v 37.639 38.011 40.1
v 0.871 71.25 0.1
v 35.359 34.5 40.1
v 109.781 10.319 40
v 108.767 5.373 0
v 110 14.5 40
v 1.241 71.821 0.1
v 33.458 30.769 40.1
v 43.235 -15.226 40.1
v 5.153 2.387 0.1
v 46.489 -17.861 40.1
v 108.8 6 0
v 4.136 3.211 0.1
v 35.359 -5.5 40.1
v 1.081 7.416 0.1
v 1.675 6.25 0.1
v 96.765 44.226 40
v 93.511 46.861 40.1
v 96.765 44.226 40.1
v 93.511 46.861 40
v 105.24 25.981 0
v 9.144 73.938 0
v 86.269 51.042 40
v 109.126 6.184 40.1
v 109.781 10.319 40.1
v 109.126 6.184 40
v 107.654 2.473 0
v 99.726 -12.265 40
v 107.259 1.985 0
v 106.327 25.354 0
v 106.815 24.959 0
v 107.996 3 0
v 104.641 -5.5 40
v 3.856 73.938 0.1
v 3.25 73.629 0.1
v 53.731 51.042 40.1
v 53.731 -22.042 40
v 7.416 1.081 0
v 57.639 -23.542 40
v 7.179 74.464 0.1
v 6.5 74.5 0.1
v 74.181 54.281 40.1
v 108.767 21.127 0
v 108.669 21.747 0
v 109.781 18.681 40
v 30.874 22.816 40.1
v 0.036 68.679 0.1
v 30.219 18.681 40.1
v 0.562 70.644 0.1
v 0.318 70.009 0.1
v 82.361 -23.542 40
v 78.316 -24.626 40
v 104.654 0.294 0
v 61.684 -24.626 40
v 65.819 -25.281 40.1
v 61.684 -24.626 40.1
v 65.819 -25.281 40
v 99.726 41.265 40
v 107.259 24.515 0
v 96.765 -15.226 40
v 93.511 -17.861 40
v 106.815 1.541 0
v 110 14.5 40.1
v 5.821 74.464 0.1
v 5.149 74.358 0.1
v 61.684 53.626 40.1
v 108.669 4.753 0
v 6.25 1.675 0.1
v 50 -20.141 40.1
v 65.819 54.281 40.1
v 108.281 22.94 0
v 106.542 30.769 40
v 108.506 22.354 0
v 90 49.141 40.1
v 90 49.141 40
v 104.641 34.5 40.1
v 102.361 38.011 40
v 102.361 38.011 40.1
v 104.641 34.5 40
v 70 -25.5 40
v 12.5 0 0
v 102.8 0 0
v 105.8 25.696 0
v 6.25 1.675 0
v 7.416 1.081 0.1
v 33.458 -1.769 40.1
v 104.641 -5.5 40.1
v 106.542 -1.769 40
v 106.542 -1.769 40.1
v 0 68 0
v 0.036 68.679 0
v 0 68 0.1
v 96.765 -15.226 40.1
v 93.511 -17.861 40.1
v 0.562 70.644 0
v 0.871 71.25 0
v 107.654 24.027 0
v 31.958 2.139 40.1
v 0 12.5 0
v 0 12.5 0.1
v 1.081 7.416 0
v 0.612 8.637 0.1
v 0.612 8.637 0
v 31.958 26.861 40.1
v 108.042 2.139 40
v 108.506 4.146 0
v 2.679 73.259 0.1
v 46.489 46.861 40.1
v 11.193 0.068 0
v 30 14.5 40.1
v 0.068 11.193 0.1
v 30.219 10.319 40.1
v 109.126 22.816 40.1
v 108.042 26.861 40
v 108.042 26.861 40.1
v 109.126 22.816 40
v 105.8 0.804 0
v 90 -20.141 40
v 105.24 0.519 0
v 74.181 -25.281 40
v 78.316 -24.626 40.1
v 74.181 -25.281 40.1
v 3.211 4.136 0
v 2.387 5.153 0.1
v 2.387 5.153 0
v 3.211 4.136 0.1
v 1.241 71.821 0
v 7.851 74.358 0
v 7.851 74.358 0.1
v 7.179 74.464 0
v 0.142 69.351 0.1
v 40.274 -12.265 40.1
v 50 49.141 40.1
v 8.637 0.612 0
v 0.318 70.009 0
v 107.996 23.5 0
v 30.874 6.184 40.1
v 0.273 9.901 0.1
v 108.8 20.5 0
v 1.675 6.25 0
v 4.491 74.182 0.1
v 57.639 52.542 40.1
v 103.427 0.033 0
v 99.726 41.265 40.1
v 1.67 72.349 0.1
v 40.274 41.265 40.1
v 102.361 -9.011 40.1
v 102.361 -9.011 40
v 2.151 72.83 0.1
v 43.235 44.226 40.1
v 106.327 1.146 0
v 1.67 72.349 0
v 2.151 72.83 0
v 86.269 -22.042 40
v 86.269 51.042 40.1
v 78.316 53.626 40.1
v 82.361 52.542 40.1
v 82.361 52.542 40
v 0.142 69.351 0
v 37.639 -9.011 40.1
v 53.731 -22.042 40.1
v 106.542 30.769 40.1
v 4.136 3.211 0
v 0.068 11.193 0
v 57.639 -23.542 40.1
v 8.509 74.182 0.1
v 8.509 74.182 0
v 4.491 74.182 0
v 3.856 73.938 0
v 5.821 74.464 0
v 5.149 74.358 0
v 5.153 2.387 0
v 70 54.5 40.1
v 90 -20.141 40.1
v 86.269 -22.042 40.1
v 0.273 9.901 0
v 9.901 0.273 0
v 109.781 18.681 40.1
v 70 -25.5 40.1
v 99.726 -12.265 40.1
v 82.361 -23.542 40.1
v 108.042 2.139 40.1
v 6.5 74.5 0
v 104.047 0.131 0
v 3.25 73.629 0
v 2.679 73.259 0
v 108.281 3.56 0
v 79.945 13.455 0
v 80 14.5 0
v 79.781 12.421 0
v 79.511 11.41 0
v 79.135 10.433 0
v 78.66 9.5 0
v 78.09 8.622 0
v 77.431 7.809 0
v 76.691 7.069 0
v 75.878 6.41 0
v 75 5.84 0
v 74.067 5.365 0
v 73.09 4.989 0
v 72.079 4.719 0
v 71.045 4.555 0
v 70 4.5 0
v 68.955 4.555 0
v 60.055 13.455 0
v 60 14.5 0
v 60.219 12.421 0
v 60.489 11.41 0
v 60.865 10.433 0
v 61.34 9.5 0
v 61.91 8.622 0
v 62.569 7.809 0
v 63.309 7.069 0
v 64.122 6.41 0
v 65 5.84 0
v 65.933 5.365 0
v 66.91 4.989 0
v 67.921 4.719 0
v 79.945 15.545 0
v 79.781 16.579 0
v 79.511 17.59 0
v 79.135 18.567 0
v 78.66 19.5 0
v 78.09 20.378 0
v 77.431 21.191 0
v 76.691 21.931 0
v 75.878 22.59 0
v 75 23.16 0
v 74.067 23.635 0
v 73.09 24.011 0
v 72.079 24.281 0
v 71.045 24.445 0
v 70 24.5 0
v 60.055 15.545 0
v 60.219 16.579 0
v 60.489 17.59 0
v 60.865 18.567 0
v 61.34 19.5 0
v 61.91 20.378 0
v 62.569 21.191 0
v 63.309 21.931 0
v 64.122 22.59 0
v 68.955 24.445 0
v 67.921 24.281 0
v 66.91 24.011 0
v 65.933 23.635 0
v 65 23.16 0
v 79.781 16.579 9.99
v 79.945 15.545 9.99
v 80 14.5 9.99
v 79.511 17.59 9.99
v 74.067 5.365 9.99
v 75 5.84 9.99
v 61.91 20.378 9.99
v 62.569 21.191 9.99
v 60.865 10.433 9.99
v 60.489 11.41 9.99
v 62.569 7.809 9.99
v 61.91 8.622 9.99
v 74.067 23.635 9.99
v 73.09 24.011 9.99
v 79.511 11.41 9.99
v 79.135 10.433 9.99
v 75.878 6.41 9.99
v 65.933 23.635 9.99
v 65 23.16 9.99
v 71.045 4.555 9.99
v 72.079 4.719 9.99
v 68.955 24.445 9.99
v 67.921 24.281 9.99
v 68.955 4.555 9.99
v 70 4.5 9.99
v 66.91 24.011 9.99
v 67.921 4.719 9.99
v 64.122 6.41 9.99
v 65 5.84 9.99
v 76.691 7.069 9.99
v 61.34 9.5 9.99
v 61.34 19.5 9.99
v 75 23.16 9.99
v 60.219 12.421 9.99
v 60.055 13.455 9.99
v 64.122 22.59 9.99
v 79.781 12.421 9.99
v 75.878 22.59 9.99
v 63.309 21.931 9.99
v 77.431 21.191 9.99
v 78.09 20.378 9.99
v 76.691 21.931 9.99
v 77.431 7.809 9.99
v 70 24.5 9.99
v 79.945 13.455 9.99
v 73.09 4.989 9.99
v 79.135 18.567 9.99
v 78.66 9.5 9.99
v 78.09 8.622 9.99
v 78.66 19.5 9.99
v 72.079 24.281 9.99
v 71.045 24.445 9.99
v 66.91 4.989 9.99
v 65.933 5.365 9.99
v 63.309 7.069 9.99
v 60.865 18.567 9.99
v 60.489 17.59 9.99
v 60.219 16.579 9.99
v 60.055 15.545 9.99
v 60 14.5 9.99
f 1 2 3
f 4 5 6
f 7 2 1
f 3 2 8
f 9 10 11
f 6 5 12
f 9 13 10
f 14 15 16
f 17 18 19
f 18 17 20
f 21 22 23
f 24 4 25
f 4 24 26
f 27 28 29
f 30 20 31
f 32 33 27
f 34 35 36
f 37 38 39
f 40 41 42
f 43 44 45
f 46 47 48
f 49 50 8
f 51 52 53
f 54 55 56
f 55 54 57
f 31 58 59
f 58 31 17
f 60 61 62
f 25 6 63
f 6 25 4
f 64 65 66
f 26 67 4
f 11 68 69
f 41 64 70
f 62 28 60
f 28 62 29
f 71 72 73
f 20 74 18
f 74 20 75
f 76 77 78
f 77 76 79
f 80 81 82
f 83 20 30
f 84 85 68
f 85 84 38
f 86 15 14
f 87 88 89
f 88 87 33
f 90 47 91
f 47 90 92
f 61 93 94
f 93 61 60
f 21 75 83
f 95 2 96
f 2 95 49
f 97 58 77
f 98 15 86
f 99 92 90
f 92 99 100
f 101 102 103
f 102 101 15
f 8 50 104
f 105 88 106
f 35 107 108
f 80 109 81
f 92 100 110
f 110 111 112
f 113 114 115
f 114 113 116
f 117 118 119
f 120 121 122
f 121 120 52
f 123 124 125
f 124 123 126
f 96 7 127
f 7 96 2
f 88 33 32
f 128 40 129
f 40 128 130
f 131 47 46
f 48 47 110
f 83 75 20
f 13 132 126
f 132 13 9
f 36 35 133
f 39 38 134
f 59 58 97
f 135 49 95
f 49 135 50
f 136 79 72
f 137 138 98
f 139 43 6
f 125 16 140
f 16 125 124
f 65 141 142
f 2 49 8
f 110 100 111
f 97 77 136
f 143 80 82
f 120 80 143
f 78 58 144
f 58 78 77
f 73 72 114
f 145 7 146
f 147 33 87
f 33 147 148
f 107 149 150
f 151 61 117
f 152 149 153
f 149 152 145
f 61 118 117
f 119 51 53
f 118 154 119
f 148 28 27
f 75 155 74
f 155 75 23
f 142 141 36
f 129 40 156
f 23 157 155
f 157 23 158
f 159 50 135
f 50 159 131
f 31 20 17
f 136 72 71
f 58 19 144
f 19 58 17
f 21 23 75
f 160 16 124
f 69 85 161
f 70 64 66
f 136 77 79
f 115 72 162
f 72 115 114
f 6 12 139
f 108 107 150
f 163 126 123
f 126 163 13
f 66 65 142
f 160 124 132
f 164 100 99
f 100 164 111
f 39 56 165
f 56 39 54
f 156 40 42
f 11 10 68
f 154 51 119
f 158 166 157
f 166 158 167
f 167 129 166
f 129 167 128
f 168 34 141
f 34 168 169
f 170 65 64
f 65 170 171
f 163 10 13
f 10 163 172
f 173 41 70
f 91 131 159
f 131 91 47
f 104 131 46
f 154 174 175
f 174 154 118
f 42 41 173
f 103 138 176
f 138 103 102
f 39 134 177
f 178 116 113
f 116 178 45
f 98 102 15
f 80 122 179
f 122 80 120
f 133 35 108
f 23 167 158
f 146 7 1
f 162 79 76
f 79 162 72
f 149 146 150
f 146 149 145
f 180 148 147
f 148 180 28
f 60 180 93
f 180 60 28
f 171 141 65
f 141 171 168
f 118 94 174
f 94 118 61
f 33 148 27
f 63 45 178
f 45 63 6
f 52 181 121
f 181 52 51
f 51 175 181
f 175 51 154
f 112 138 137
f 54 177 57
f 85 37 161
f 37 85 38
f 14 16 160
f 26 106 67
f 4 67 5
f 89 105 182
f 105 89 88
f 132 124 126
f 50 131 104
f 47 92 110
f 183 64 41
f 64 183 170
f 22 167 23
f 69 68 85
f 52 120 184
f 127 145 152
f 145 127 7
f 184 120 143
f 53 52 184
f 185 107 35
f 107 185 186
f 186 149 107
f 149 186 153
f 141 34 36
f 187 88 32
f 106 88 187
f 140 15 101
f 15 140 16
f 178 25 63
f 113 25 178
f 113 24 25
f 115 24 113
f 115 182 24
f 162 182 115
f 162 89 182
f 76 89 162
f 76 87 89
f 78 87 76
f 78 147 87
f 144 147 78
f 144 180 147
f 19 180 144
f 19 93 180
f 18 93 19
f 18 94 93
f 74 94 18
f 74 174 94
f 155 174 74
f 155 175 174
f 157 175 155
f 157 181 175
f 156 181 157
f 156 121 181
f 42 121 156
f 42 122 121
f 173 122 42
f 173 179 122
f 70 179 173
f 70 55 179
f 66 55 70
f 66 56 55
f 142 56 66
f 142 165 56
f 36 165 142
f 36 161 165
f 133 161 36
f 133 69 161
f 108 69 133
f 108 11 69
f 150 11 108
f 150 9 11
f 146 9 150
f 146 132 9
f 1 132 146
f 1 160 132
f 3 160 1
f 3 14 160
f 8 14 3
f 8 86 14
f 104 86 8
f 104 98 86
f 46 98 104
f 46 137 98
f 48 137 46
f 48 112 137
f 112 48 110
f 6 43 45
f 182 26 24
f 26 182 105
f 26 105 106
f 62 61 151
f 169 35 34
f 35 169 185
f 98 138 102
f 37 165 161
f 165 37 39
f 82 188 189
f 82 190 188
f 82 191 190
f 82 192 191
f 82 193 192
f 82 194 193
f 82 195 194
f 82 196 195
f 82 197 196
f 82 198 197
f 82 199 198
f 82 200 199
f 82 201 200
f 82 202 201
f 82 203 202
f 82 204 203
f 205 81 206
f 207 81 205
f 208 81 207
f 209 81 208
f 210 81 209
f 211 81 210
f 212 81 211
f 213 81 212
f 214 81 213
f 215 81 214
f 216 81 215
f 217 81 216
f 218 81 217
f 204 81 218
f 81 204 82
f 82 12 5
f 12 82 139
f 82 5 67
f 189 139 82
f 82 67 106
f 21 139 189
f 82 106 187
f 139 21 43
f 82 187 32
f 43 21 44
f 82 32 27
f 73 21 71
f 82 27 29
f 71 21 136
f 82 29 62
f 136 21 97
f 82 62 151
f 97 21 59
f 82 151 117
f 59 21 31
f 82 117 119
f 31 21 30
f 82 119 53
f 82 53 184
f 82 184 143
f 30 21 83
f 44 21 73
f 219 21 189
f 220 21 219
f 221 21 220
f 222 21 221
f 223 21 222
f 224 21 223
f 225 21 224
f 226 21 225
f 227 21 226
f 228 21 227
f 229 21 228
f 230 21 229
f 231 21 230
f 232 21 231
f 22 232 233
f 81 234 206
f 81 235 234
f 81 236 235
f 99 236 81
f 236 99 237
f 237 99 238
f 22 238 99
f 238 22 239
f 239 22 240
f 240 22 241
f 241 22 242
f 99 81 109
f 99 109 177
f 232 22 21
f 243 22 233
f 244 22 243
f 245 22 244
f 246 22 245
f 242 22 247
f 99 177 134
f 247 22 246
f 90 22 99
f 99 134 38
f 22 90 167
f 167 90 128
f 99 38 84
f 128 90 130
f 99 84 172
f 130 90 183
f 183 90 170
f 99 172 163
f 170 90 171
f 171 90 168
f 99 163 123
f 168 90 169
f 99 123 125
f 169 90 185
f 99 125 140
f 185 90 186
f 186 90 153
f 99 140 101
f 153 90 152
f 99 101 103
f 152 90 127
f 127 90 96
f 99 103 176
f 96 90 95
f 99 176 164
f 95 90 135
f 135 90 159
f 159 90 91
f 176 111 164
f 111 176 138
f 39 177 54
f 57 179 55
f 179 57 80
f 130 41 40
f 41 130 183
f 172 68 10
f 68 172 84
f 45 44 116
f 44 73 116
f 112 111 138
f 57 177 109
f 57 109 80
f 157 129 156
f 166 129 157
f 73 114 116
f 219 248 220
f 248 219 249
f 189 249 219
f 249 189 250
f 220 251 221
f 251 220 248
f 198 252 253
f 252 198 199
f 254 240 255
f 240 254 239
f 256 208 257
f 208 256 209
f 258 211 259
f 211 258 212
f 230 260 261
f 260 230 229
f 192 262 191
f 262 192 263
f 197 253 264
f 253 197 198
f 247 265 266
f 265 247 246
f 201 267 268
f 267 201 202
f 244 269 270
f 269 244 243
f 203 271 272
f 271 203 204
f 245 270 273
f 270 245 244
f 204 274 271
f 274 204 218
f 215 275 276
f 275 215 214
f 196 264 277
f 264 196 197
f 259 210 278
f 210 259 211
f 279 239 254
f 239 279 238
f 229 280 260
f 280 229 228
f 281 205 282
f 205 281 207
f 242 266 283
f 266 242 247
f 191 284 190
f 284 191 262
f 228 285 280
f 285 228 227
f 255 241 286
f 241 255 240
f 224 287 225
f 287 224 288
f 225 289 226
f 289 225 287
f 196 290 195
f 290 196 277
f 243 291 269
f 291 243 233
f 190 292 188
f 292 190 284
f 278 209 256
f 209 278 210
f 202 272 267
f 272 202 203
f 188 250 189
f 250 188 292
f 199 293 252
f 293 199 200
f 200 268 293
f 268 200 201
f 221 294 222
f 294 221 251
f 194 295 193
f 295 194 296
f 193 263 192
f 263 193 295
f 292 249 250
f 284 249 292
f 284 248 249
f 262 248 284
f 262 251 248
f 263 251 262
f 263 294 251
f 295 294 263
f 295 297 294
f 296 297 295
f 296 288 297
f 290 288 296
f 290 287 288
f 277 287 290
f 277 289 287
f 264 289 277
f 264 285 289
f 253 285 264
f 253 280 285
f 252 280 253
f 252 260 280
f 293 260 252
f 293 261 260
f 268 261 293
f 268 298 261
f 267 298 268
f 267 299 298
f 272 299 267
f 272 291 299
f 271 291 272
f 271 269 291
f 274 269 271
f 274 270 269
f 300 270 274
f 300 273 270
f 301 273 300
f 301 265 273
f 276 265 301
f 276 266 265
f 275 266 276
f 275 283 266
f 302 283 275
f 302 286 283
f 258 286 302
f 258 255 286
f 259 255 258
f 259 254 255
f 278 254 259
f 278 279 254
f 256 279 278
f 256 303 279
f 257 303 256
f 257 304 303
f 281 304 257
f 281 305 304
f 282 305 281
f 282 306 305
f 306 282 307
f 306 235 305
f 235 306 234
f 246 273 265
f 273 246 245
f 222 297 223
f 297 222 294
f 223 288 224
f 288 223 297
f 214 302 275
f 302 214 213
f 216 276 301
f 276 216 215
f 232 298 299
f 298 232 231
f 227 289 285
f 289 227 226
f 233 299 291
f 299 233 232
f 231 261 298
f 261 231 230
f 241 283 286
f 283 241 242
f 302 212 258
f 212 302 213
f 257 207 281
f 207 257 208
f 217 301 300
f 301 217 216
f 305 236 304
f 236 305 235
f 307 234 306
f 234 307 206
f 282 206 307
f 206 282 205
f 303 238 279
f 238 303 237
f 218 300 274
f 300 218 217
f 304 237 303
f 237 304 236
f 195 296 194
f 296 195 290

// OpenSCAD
// Aston Martin jacking spacer

$fn = 60;

difference() {
  hull() {
    linear_extrude(0.1) plate();
    translate([80-PIN_DIA/2, 24.5-PIN_DIA/2, 40]) linear_extrude(0.1) circle(d=80);
  }
  PIN_DIA = 19 + 1;
  PIN_HEIGHT = 8 + 2;
  translate([80-PIN_DIA/2, 24.5-PIN_DIA/2, -0.01]) cylinder(d=PIN_DIA, h=PIN_HEIGHT);
}

module plate() {
  hull() {
    translate([12.5, 12.5]) circle(12.5);
    translate([0,74.5]) translate([6.5, -6.5]) circle(6.5);
    translate([0,74.5]) translate([6.5, -6.5]) circle(6.5);
    translate([108.8,0]) translate([-6, 6]) circle(6);
    translate([108.8,26.5]) translate([-6, -6]) circle(6);
  }
}
